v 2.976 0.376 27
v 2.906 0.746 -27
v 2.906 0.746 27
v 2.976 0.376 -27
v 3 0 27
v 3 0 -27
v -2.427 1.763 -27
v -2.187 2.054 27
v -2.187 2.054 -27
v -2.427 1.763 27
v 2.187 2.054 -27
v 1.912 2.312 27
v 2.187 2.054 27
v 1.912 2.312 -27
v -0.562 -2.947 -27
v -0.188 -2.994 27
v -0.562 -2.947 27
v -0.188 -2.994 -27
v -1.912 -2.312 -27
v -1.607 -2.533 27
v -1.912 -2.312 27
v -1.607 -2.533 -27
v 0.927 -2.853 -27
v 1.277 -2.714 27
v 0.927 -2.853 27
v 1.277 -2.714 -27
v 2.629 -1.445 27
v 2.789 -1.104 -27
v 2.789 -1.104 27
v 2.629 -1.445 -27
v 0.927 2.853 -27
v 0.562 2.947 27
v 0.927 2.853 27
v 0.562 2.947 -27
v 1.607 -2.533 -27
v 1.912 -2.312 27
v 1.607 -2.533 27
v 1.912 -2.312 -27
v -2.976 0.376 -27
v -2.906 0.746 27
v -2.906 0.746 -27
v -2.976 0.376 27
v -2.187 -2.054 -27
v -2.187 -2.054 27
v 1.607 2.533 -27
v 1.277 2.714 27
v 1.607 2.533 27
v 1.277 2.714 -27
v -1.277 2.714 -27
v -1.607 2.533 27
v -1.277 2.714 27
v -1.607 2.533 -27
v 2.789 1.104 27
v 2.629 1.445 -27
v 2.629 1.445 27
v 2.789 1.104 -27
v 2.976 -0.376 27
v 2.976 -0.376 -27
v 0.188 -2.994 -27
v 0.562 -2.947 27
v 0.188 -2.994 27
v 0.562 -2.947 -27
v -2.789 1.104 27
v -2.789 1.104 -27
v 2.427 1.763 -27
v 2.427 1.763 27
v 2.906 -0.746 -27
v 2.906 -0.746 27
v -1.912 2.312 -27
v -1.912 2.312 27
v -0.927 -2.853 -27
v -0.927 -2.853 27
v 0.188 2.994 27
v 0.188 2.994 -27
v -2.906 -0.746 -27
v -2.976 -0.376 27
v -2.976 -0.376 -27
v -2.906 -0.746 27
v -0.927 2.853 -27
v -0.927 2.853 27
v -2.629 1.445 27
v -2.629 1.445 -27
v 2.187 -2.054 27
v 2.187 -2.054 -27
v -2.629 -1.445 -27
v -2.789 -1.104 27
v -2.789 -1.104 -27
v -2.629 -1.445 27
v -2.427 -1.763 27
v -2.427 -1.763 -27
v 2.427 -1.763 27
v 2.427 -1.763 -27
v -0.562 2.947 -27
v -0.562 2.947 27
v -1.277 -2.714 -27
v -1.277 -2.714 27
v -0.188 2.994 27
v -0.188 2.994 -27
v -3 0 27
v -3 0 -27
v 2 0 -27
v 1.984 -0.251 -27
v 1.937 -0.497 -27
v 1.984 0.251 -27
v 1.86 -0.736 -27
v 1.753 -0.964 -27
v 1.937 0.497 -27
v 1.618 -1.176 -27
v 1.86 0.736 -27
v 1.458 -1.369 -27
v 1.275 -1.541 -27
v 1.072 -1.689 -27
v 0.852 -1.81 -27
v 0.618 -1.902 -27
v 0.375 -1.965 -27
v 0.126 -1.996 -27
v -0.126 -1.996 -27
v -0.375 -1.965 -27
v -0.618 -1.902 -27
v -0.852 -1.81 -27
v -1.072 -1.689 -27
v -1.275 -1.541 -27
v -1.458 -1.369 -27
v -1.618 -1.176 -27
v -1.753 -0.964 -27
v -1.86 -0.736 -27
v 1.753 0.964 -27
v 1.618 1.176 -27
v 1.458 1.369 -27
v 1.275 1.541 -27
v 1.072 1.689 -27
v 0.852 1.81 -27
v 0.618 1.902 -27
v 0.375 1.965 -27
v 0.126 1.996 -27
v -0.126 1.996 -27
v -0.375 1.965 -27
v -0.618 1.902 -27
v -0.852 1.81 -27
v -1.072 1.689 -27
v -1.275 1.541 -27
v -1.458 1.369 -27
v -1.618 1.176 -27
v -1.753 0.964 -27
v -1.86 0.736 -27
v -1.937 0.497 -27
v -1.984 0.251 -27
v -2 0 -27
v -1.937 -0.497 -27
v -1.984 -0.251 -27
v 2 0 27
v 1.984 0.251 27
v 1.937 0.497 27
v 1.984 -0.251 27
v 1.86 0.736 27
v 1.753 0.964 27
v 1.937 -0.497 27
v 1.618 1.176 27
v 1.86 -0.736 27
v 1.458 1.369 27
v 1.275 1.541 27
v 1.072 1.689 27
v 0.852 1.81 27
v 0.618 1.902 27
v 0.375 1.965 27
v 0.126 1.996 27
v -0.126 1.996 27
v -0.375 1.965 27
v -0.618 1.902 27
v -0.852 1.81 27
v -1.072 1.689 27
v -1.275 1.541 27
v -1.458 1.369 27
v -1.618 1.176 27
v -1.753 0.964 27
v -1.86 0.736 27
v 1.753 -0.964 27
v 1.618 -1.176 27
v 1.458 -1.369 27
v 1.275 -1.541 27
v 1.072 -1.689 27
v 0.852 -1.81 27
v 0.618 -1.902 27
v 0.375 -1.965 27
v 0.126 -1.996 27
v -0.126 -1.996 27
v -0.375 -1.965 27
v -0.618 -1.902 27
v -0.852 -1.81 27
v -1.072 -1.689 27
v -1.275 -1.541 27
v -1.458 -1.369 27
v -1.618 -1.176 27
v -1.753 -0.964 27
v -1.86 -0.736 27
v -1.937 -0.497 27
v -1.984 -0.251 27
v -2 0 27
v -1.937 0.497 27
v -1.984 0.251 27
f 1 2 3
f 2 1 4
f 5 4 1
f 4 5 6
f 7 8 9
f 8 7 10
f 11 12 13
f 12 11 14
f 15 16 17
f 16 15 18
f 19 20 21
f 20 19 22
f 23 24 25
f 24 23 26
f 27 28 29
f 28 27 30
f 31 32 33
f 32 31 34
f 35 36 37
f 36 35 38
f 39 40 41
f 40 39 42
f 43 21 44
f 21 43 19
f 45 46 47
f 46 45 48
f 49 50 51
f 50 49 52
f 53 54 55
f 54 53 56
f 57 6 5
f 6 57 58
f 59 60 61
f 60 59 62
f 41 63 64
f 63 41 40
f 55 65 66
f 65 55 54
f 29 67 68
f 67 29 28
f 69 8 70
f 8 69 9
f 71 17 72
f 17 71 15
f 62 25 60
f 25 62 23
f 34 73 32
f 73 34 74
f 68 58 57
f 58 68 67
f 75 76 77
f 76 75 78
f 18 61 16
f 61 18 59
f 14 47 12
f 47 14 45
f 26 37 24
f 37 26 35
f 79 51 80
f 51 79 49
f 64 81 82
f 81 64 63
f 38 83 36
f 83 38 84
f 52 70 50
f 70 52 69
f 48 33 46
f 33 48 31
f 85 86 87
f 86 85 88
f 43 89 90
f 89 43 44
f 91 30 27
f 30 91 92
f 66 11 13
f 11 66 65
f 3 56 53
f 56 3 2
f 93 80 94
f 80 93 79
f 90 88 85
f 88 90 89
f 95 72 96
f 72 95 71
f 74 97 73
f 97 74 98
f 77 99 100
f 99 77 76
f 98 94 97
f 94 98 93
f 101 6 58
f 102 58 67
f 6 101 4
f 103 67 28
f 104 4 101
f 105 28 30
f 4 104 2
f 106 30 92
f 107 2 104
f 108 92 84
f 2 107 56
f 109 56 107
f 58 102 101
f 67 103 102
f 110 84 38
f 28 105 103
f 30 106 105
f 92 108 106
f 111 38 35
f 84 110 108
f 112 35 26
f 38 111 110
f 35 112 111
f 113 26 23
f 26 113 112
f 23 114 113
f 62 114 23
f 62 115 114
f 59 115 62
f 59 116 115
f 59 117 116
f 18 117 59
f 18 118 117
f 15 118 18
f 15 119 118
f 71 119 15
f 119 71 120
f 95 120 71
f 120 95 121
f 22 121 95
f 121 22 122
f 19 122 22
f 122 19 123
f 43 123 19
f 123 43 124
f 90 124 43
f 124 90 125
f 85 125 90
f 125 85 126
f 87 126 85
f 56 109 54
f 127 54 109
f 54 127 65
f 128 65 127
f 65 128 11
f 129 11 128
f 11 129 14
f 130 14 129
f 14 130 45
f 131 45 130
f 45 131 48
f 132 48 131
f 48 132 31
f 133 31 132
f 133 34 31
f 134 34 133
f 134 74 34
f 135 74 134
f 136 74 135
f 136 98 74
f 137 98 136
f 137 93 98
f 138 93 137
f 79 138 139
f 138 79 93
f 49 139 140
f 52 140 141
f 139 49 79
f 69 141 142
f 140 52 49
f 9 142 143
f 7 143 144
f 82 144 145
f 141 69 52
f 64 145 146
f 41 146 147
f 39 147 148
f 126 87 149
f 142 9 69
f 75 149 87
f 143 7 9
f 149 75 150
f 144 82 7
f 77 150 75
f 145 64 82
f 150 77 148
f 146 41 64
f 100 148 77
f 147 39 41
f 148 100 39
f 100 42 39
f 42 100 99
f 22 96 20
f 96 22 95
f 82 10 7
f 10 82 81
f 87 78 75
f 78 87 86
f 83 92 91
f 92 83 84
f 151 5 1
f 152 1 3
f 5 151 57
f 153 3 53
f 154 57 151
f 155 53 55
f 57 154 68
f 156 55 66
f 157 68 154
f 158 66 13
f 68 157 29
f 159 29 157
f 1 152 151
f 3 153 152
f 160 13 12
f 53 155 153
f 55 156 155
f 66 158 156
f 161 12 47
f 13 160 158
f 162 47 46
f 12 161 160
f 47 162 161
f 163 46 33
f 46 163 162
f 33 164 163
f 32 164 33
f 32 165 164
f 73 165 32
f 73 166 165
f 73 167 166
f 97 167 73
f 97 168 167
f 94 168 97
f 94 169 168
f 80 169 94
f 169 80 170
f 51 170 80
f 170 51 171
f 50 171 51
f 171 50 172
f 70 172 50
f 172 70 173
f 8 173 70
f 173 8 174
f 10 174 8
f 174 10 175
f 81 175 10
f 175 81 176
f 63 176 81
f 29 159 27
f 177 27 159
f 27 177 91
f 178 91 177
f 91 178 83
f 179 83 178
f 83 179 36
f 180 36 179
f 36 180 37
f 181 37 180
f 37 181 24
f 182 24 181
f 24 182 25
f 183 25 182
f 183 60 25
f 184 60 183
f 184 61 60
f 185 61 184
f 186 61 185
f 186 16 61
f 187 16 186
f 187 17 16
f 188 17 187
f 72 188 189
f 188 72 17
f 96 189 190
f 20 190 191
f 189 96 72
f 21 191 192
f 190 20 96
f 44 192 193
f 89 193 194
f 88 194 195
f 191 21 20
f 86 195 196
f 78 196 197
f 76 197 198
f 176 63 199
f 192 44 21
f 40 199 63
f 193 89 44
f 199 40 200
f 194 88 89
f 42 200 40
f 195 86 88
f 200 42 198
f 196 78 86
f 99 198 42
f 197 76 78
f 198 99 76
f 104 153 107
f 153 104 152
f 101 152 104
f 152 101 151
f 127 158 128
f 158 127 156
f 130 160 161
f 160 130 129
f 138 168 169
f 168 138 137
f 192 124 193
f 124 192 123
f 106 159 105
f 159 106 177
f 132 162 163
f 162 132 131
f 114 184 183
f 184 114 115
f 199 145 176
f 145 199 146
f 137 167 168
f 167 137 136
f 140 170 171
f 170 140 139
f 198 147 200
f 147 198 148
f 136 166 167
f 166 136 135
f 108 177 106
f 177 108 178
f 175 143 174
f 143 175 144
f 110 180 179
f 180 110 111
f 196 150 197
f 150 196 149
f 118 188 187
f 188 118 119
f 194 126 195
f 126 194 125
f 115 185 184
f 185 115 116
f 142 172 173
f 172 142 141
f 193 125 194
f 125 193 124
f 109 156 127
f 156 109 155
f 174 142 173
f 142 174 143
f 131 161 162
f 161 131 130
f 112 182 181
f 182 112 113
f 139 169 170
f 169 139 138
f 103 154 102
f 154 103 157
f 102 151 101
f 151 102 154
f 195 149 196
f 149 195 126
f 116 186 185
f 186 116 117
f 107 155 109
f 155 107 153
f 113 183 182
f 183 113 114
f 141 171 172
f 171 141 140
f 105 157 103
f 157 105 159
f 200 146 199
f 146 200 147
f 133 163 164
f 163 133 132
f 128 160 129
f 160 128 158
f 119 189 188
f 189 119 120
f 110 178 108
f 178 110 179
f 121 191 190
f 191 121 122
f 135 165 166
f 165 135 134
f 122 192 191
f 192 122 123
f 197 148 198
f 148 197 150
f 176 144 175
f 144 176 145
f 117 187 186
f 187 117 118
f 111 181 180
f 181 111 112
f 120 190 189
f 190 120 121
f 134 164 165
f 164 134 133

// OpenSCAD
$fn = 50;


difference() {
	union() {
		translate(v = [0, 0, -27.0000000000]) {
			cylinder(h = 54, r = 3.0000000000);
		}
	}
	union() {
		translate(v = [0, 0, -100.0000000000]) {
			cylinder(h = 200, r = 2.0000000000);
		}
	}
}
